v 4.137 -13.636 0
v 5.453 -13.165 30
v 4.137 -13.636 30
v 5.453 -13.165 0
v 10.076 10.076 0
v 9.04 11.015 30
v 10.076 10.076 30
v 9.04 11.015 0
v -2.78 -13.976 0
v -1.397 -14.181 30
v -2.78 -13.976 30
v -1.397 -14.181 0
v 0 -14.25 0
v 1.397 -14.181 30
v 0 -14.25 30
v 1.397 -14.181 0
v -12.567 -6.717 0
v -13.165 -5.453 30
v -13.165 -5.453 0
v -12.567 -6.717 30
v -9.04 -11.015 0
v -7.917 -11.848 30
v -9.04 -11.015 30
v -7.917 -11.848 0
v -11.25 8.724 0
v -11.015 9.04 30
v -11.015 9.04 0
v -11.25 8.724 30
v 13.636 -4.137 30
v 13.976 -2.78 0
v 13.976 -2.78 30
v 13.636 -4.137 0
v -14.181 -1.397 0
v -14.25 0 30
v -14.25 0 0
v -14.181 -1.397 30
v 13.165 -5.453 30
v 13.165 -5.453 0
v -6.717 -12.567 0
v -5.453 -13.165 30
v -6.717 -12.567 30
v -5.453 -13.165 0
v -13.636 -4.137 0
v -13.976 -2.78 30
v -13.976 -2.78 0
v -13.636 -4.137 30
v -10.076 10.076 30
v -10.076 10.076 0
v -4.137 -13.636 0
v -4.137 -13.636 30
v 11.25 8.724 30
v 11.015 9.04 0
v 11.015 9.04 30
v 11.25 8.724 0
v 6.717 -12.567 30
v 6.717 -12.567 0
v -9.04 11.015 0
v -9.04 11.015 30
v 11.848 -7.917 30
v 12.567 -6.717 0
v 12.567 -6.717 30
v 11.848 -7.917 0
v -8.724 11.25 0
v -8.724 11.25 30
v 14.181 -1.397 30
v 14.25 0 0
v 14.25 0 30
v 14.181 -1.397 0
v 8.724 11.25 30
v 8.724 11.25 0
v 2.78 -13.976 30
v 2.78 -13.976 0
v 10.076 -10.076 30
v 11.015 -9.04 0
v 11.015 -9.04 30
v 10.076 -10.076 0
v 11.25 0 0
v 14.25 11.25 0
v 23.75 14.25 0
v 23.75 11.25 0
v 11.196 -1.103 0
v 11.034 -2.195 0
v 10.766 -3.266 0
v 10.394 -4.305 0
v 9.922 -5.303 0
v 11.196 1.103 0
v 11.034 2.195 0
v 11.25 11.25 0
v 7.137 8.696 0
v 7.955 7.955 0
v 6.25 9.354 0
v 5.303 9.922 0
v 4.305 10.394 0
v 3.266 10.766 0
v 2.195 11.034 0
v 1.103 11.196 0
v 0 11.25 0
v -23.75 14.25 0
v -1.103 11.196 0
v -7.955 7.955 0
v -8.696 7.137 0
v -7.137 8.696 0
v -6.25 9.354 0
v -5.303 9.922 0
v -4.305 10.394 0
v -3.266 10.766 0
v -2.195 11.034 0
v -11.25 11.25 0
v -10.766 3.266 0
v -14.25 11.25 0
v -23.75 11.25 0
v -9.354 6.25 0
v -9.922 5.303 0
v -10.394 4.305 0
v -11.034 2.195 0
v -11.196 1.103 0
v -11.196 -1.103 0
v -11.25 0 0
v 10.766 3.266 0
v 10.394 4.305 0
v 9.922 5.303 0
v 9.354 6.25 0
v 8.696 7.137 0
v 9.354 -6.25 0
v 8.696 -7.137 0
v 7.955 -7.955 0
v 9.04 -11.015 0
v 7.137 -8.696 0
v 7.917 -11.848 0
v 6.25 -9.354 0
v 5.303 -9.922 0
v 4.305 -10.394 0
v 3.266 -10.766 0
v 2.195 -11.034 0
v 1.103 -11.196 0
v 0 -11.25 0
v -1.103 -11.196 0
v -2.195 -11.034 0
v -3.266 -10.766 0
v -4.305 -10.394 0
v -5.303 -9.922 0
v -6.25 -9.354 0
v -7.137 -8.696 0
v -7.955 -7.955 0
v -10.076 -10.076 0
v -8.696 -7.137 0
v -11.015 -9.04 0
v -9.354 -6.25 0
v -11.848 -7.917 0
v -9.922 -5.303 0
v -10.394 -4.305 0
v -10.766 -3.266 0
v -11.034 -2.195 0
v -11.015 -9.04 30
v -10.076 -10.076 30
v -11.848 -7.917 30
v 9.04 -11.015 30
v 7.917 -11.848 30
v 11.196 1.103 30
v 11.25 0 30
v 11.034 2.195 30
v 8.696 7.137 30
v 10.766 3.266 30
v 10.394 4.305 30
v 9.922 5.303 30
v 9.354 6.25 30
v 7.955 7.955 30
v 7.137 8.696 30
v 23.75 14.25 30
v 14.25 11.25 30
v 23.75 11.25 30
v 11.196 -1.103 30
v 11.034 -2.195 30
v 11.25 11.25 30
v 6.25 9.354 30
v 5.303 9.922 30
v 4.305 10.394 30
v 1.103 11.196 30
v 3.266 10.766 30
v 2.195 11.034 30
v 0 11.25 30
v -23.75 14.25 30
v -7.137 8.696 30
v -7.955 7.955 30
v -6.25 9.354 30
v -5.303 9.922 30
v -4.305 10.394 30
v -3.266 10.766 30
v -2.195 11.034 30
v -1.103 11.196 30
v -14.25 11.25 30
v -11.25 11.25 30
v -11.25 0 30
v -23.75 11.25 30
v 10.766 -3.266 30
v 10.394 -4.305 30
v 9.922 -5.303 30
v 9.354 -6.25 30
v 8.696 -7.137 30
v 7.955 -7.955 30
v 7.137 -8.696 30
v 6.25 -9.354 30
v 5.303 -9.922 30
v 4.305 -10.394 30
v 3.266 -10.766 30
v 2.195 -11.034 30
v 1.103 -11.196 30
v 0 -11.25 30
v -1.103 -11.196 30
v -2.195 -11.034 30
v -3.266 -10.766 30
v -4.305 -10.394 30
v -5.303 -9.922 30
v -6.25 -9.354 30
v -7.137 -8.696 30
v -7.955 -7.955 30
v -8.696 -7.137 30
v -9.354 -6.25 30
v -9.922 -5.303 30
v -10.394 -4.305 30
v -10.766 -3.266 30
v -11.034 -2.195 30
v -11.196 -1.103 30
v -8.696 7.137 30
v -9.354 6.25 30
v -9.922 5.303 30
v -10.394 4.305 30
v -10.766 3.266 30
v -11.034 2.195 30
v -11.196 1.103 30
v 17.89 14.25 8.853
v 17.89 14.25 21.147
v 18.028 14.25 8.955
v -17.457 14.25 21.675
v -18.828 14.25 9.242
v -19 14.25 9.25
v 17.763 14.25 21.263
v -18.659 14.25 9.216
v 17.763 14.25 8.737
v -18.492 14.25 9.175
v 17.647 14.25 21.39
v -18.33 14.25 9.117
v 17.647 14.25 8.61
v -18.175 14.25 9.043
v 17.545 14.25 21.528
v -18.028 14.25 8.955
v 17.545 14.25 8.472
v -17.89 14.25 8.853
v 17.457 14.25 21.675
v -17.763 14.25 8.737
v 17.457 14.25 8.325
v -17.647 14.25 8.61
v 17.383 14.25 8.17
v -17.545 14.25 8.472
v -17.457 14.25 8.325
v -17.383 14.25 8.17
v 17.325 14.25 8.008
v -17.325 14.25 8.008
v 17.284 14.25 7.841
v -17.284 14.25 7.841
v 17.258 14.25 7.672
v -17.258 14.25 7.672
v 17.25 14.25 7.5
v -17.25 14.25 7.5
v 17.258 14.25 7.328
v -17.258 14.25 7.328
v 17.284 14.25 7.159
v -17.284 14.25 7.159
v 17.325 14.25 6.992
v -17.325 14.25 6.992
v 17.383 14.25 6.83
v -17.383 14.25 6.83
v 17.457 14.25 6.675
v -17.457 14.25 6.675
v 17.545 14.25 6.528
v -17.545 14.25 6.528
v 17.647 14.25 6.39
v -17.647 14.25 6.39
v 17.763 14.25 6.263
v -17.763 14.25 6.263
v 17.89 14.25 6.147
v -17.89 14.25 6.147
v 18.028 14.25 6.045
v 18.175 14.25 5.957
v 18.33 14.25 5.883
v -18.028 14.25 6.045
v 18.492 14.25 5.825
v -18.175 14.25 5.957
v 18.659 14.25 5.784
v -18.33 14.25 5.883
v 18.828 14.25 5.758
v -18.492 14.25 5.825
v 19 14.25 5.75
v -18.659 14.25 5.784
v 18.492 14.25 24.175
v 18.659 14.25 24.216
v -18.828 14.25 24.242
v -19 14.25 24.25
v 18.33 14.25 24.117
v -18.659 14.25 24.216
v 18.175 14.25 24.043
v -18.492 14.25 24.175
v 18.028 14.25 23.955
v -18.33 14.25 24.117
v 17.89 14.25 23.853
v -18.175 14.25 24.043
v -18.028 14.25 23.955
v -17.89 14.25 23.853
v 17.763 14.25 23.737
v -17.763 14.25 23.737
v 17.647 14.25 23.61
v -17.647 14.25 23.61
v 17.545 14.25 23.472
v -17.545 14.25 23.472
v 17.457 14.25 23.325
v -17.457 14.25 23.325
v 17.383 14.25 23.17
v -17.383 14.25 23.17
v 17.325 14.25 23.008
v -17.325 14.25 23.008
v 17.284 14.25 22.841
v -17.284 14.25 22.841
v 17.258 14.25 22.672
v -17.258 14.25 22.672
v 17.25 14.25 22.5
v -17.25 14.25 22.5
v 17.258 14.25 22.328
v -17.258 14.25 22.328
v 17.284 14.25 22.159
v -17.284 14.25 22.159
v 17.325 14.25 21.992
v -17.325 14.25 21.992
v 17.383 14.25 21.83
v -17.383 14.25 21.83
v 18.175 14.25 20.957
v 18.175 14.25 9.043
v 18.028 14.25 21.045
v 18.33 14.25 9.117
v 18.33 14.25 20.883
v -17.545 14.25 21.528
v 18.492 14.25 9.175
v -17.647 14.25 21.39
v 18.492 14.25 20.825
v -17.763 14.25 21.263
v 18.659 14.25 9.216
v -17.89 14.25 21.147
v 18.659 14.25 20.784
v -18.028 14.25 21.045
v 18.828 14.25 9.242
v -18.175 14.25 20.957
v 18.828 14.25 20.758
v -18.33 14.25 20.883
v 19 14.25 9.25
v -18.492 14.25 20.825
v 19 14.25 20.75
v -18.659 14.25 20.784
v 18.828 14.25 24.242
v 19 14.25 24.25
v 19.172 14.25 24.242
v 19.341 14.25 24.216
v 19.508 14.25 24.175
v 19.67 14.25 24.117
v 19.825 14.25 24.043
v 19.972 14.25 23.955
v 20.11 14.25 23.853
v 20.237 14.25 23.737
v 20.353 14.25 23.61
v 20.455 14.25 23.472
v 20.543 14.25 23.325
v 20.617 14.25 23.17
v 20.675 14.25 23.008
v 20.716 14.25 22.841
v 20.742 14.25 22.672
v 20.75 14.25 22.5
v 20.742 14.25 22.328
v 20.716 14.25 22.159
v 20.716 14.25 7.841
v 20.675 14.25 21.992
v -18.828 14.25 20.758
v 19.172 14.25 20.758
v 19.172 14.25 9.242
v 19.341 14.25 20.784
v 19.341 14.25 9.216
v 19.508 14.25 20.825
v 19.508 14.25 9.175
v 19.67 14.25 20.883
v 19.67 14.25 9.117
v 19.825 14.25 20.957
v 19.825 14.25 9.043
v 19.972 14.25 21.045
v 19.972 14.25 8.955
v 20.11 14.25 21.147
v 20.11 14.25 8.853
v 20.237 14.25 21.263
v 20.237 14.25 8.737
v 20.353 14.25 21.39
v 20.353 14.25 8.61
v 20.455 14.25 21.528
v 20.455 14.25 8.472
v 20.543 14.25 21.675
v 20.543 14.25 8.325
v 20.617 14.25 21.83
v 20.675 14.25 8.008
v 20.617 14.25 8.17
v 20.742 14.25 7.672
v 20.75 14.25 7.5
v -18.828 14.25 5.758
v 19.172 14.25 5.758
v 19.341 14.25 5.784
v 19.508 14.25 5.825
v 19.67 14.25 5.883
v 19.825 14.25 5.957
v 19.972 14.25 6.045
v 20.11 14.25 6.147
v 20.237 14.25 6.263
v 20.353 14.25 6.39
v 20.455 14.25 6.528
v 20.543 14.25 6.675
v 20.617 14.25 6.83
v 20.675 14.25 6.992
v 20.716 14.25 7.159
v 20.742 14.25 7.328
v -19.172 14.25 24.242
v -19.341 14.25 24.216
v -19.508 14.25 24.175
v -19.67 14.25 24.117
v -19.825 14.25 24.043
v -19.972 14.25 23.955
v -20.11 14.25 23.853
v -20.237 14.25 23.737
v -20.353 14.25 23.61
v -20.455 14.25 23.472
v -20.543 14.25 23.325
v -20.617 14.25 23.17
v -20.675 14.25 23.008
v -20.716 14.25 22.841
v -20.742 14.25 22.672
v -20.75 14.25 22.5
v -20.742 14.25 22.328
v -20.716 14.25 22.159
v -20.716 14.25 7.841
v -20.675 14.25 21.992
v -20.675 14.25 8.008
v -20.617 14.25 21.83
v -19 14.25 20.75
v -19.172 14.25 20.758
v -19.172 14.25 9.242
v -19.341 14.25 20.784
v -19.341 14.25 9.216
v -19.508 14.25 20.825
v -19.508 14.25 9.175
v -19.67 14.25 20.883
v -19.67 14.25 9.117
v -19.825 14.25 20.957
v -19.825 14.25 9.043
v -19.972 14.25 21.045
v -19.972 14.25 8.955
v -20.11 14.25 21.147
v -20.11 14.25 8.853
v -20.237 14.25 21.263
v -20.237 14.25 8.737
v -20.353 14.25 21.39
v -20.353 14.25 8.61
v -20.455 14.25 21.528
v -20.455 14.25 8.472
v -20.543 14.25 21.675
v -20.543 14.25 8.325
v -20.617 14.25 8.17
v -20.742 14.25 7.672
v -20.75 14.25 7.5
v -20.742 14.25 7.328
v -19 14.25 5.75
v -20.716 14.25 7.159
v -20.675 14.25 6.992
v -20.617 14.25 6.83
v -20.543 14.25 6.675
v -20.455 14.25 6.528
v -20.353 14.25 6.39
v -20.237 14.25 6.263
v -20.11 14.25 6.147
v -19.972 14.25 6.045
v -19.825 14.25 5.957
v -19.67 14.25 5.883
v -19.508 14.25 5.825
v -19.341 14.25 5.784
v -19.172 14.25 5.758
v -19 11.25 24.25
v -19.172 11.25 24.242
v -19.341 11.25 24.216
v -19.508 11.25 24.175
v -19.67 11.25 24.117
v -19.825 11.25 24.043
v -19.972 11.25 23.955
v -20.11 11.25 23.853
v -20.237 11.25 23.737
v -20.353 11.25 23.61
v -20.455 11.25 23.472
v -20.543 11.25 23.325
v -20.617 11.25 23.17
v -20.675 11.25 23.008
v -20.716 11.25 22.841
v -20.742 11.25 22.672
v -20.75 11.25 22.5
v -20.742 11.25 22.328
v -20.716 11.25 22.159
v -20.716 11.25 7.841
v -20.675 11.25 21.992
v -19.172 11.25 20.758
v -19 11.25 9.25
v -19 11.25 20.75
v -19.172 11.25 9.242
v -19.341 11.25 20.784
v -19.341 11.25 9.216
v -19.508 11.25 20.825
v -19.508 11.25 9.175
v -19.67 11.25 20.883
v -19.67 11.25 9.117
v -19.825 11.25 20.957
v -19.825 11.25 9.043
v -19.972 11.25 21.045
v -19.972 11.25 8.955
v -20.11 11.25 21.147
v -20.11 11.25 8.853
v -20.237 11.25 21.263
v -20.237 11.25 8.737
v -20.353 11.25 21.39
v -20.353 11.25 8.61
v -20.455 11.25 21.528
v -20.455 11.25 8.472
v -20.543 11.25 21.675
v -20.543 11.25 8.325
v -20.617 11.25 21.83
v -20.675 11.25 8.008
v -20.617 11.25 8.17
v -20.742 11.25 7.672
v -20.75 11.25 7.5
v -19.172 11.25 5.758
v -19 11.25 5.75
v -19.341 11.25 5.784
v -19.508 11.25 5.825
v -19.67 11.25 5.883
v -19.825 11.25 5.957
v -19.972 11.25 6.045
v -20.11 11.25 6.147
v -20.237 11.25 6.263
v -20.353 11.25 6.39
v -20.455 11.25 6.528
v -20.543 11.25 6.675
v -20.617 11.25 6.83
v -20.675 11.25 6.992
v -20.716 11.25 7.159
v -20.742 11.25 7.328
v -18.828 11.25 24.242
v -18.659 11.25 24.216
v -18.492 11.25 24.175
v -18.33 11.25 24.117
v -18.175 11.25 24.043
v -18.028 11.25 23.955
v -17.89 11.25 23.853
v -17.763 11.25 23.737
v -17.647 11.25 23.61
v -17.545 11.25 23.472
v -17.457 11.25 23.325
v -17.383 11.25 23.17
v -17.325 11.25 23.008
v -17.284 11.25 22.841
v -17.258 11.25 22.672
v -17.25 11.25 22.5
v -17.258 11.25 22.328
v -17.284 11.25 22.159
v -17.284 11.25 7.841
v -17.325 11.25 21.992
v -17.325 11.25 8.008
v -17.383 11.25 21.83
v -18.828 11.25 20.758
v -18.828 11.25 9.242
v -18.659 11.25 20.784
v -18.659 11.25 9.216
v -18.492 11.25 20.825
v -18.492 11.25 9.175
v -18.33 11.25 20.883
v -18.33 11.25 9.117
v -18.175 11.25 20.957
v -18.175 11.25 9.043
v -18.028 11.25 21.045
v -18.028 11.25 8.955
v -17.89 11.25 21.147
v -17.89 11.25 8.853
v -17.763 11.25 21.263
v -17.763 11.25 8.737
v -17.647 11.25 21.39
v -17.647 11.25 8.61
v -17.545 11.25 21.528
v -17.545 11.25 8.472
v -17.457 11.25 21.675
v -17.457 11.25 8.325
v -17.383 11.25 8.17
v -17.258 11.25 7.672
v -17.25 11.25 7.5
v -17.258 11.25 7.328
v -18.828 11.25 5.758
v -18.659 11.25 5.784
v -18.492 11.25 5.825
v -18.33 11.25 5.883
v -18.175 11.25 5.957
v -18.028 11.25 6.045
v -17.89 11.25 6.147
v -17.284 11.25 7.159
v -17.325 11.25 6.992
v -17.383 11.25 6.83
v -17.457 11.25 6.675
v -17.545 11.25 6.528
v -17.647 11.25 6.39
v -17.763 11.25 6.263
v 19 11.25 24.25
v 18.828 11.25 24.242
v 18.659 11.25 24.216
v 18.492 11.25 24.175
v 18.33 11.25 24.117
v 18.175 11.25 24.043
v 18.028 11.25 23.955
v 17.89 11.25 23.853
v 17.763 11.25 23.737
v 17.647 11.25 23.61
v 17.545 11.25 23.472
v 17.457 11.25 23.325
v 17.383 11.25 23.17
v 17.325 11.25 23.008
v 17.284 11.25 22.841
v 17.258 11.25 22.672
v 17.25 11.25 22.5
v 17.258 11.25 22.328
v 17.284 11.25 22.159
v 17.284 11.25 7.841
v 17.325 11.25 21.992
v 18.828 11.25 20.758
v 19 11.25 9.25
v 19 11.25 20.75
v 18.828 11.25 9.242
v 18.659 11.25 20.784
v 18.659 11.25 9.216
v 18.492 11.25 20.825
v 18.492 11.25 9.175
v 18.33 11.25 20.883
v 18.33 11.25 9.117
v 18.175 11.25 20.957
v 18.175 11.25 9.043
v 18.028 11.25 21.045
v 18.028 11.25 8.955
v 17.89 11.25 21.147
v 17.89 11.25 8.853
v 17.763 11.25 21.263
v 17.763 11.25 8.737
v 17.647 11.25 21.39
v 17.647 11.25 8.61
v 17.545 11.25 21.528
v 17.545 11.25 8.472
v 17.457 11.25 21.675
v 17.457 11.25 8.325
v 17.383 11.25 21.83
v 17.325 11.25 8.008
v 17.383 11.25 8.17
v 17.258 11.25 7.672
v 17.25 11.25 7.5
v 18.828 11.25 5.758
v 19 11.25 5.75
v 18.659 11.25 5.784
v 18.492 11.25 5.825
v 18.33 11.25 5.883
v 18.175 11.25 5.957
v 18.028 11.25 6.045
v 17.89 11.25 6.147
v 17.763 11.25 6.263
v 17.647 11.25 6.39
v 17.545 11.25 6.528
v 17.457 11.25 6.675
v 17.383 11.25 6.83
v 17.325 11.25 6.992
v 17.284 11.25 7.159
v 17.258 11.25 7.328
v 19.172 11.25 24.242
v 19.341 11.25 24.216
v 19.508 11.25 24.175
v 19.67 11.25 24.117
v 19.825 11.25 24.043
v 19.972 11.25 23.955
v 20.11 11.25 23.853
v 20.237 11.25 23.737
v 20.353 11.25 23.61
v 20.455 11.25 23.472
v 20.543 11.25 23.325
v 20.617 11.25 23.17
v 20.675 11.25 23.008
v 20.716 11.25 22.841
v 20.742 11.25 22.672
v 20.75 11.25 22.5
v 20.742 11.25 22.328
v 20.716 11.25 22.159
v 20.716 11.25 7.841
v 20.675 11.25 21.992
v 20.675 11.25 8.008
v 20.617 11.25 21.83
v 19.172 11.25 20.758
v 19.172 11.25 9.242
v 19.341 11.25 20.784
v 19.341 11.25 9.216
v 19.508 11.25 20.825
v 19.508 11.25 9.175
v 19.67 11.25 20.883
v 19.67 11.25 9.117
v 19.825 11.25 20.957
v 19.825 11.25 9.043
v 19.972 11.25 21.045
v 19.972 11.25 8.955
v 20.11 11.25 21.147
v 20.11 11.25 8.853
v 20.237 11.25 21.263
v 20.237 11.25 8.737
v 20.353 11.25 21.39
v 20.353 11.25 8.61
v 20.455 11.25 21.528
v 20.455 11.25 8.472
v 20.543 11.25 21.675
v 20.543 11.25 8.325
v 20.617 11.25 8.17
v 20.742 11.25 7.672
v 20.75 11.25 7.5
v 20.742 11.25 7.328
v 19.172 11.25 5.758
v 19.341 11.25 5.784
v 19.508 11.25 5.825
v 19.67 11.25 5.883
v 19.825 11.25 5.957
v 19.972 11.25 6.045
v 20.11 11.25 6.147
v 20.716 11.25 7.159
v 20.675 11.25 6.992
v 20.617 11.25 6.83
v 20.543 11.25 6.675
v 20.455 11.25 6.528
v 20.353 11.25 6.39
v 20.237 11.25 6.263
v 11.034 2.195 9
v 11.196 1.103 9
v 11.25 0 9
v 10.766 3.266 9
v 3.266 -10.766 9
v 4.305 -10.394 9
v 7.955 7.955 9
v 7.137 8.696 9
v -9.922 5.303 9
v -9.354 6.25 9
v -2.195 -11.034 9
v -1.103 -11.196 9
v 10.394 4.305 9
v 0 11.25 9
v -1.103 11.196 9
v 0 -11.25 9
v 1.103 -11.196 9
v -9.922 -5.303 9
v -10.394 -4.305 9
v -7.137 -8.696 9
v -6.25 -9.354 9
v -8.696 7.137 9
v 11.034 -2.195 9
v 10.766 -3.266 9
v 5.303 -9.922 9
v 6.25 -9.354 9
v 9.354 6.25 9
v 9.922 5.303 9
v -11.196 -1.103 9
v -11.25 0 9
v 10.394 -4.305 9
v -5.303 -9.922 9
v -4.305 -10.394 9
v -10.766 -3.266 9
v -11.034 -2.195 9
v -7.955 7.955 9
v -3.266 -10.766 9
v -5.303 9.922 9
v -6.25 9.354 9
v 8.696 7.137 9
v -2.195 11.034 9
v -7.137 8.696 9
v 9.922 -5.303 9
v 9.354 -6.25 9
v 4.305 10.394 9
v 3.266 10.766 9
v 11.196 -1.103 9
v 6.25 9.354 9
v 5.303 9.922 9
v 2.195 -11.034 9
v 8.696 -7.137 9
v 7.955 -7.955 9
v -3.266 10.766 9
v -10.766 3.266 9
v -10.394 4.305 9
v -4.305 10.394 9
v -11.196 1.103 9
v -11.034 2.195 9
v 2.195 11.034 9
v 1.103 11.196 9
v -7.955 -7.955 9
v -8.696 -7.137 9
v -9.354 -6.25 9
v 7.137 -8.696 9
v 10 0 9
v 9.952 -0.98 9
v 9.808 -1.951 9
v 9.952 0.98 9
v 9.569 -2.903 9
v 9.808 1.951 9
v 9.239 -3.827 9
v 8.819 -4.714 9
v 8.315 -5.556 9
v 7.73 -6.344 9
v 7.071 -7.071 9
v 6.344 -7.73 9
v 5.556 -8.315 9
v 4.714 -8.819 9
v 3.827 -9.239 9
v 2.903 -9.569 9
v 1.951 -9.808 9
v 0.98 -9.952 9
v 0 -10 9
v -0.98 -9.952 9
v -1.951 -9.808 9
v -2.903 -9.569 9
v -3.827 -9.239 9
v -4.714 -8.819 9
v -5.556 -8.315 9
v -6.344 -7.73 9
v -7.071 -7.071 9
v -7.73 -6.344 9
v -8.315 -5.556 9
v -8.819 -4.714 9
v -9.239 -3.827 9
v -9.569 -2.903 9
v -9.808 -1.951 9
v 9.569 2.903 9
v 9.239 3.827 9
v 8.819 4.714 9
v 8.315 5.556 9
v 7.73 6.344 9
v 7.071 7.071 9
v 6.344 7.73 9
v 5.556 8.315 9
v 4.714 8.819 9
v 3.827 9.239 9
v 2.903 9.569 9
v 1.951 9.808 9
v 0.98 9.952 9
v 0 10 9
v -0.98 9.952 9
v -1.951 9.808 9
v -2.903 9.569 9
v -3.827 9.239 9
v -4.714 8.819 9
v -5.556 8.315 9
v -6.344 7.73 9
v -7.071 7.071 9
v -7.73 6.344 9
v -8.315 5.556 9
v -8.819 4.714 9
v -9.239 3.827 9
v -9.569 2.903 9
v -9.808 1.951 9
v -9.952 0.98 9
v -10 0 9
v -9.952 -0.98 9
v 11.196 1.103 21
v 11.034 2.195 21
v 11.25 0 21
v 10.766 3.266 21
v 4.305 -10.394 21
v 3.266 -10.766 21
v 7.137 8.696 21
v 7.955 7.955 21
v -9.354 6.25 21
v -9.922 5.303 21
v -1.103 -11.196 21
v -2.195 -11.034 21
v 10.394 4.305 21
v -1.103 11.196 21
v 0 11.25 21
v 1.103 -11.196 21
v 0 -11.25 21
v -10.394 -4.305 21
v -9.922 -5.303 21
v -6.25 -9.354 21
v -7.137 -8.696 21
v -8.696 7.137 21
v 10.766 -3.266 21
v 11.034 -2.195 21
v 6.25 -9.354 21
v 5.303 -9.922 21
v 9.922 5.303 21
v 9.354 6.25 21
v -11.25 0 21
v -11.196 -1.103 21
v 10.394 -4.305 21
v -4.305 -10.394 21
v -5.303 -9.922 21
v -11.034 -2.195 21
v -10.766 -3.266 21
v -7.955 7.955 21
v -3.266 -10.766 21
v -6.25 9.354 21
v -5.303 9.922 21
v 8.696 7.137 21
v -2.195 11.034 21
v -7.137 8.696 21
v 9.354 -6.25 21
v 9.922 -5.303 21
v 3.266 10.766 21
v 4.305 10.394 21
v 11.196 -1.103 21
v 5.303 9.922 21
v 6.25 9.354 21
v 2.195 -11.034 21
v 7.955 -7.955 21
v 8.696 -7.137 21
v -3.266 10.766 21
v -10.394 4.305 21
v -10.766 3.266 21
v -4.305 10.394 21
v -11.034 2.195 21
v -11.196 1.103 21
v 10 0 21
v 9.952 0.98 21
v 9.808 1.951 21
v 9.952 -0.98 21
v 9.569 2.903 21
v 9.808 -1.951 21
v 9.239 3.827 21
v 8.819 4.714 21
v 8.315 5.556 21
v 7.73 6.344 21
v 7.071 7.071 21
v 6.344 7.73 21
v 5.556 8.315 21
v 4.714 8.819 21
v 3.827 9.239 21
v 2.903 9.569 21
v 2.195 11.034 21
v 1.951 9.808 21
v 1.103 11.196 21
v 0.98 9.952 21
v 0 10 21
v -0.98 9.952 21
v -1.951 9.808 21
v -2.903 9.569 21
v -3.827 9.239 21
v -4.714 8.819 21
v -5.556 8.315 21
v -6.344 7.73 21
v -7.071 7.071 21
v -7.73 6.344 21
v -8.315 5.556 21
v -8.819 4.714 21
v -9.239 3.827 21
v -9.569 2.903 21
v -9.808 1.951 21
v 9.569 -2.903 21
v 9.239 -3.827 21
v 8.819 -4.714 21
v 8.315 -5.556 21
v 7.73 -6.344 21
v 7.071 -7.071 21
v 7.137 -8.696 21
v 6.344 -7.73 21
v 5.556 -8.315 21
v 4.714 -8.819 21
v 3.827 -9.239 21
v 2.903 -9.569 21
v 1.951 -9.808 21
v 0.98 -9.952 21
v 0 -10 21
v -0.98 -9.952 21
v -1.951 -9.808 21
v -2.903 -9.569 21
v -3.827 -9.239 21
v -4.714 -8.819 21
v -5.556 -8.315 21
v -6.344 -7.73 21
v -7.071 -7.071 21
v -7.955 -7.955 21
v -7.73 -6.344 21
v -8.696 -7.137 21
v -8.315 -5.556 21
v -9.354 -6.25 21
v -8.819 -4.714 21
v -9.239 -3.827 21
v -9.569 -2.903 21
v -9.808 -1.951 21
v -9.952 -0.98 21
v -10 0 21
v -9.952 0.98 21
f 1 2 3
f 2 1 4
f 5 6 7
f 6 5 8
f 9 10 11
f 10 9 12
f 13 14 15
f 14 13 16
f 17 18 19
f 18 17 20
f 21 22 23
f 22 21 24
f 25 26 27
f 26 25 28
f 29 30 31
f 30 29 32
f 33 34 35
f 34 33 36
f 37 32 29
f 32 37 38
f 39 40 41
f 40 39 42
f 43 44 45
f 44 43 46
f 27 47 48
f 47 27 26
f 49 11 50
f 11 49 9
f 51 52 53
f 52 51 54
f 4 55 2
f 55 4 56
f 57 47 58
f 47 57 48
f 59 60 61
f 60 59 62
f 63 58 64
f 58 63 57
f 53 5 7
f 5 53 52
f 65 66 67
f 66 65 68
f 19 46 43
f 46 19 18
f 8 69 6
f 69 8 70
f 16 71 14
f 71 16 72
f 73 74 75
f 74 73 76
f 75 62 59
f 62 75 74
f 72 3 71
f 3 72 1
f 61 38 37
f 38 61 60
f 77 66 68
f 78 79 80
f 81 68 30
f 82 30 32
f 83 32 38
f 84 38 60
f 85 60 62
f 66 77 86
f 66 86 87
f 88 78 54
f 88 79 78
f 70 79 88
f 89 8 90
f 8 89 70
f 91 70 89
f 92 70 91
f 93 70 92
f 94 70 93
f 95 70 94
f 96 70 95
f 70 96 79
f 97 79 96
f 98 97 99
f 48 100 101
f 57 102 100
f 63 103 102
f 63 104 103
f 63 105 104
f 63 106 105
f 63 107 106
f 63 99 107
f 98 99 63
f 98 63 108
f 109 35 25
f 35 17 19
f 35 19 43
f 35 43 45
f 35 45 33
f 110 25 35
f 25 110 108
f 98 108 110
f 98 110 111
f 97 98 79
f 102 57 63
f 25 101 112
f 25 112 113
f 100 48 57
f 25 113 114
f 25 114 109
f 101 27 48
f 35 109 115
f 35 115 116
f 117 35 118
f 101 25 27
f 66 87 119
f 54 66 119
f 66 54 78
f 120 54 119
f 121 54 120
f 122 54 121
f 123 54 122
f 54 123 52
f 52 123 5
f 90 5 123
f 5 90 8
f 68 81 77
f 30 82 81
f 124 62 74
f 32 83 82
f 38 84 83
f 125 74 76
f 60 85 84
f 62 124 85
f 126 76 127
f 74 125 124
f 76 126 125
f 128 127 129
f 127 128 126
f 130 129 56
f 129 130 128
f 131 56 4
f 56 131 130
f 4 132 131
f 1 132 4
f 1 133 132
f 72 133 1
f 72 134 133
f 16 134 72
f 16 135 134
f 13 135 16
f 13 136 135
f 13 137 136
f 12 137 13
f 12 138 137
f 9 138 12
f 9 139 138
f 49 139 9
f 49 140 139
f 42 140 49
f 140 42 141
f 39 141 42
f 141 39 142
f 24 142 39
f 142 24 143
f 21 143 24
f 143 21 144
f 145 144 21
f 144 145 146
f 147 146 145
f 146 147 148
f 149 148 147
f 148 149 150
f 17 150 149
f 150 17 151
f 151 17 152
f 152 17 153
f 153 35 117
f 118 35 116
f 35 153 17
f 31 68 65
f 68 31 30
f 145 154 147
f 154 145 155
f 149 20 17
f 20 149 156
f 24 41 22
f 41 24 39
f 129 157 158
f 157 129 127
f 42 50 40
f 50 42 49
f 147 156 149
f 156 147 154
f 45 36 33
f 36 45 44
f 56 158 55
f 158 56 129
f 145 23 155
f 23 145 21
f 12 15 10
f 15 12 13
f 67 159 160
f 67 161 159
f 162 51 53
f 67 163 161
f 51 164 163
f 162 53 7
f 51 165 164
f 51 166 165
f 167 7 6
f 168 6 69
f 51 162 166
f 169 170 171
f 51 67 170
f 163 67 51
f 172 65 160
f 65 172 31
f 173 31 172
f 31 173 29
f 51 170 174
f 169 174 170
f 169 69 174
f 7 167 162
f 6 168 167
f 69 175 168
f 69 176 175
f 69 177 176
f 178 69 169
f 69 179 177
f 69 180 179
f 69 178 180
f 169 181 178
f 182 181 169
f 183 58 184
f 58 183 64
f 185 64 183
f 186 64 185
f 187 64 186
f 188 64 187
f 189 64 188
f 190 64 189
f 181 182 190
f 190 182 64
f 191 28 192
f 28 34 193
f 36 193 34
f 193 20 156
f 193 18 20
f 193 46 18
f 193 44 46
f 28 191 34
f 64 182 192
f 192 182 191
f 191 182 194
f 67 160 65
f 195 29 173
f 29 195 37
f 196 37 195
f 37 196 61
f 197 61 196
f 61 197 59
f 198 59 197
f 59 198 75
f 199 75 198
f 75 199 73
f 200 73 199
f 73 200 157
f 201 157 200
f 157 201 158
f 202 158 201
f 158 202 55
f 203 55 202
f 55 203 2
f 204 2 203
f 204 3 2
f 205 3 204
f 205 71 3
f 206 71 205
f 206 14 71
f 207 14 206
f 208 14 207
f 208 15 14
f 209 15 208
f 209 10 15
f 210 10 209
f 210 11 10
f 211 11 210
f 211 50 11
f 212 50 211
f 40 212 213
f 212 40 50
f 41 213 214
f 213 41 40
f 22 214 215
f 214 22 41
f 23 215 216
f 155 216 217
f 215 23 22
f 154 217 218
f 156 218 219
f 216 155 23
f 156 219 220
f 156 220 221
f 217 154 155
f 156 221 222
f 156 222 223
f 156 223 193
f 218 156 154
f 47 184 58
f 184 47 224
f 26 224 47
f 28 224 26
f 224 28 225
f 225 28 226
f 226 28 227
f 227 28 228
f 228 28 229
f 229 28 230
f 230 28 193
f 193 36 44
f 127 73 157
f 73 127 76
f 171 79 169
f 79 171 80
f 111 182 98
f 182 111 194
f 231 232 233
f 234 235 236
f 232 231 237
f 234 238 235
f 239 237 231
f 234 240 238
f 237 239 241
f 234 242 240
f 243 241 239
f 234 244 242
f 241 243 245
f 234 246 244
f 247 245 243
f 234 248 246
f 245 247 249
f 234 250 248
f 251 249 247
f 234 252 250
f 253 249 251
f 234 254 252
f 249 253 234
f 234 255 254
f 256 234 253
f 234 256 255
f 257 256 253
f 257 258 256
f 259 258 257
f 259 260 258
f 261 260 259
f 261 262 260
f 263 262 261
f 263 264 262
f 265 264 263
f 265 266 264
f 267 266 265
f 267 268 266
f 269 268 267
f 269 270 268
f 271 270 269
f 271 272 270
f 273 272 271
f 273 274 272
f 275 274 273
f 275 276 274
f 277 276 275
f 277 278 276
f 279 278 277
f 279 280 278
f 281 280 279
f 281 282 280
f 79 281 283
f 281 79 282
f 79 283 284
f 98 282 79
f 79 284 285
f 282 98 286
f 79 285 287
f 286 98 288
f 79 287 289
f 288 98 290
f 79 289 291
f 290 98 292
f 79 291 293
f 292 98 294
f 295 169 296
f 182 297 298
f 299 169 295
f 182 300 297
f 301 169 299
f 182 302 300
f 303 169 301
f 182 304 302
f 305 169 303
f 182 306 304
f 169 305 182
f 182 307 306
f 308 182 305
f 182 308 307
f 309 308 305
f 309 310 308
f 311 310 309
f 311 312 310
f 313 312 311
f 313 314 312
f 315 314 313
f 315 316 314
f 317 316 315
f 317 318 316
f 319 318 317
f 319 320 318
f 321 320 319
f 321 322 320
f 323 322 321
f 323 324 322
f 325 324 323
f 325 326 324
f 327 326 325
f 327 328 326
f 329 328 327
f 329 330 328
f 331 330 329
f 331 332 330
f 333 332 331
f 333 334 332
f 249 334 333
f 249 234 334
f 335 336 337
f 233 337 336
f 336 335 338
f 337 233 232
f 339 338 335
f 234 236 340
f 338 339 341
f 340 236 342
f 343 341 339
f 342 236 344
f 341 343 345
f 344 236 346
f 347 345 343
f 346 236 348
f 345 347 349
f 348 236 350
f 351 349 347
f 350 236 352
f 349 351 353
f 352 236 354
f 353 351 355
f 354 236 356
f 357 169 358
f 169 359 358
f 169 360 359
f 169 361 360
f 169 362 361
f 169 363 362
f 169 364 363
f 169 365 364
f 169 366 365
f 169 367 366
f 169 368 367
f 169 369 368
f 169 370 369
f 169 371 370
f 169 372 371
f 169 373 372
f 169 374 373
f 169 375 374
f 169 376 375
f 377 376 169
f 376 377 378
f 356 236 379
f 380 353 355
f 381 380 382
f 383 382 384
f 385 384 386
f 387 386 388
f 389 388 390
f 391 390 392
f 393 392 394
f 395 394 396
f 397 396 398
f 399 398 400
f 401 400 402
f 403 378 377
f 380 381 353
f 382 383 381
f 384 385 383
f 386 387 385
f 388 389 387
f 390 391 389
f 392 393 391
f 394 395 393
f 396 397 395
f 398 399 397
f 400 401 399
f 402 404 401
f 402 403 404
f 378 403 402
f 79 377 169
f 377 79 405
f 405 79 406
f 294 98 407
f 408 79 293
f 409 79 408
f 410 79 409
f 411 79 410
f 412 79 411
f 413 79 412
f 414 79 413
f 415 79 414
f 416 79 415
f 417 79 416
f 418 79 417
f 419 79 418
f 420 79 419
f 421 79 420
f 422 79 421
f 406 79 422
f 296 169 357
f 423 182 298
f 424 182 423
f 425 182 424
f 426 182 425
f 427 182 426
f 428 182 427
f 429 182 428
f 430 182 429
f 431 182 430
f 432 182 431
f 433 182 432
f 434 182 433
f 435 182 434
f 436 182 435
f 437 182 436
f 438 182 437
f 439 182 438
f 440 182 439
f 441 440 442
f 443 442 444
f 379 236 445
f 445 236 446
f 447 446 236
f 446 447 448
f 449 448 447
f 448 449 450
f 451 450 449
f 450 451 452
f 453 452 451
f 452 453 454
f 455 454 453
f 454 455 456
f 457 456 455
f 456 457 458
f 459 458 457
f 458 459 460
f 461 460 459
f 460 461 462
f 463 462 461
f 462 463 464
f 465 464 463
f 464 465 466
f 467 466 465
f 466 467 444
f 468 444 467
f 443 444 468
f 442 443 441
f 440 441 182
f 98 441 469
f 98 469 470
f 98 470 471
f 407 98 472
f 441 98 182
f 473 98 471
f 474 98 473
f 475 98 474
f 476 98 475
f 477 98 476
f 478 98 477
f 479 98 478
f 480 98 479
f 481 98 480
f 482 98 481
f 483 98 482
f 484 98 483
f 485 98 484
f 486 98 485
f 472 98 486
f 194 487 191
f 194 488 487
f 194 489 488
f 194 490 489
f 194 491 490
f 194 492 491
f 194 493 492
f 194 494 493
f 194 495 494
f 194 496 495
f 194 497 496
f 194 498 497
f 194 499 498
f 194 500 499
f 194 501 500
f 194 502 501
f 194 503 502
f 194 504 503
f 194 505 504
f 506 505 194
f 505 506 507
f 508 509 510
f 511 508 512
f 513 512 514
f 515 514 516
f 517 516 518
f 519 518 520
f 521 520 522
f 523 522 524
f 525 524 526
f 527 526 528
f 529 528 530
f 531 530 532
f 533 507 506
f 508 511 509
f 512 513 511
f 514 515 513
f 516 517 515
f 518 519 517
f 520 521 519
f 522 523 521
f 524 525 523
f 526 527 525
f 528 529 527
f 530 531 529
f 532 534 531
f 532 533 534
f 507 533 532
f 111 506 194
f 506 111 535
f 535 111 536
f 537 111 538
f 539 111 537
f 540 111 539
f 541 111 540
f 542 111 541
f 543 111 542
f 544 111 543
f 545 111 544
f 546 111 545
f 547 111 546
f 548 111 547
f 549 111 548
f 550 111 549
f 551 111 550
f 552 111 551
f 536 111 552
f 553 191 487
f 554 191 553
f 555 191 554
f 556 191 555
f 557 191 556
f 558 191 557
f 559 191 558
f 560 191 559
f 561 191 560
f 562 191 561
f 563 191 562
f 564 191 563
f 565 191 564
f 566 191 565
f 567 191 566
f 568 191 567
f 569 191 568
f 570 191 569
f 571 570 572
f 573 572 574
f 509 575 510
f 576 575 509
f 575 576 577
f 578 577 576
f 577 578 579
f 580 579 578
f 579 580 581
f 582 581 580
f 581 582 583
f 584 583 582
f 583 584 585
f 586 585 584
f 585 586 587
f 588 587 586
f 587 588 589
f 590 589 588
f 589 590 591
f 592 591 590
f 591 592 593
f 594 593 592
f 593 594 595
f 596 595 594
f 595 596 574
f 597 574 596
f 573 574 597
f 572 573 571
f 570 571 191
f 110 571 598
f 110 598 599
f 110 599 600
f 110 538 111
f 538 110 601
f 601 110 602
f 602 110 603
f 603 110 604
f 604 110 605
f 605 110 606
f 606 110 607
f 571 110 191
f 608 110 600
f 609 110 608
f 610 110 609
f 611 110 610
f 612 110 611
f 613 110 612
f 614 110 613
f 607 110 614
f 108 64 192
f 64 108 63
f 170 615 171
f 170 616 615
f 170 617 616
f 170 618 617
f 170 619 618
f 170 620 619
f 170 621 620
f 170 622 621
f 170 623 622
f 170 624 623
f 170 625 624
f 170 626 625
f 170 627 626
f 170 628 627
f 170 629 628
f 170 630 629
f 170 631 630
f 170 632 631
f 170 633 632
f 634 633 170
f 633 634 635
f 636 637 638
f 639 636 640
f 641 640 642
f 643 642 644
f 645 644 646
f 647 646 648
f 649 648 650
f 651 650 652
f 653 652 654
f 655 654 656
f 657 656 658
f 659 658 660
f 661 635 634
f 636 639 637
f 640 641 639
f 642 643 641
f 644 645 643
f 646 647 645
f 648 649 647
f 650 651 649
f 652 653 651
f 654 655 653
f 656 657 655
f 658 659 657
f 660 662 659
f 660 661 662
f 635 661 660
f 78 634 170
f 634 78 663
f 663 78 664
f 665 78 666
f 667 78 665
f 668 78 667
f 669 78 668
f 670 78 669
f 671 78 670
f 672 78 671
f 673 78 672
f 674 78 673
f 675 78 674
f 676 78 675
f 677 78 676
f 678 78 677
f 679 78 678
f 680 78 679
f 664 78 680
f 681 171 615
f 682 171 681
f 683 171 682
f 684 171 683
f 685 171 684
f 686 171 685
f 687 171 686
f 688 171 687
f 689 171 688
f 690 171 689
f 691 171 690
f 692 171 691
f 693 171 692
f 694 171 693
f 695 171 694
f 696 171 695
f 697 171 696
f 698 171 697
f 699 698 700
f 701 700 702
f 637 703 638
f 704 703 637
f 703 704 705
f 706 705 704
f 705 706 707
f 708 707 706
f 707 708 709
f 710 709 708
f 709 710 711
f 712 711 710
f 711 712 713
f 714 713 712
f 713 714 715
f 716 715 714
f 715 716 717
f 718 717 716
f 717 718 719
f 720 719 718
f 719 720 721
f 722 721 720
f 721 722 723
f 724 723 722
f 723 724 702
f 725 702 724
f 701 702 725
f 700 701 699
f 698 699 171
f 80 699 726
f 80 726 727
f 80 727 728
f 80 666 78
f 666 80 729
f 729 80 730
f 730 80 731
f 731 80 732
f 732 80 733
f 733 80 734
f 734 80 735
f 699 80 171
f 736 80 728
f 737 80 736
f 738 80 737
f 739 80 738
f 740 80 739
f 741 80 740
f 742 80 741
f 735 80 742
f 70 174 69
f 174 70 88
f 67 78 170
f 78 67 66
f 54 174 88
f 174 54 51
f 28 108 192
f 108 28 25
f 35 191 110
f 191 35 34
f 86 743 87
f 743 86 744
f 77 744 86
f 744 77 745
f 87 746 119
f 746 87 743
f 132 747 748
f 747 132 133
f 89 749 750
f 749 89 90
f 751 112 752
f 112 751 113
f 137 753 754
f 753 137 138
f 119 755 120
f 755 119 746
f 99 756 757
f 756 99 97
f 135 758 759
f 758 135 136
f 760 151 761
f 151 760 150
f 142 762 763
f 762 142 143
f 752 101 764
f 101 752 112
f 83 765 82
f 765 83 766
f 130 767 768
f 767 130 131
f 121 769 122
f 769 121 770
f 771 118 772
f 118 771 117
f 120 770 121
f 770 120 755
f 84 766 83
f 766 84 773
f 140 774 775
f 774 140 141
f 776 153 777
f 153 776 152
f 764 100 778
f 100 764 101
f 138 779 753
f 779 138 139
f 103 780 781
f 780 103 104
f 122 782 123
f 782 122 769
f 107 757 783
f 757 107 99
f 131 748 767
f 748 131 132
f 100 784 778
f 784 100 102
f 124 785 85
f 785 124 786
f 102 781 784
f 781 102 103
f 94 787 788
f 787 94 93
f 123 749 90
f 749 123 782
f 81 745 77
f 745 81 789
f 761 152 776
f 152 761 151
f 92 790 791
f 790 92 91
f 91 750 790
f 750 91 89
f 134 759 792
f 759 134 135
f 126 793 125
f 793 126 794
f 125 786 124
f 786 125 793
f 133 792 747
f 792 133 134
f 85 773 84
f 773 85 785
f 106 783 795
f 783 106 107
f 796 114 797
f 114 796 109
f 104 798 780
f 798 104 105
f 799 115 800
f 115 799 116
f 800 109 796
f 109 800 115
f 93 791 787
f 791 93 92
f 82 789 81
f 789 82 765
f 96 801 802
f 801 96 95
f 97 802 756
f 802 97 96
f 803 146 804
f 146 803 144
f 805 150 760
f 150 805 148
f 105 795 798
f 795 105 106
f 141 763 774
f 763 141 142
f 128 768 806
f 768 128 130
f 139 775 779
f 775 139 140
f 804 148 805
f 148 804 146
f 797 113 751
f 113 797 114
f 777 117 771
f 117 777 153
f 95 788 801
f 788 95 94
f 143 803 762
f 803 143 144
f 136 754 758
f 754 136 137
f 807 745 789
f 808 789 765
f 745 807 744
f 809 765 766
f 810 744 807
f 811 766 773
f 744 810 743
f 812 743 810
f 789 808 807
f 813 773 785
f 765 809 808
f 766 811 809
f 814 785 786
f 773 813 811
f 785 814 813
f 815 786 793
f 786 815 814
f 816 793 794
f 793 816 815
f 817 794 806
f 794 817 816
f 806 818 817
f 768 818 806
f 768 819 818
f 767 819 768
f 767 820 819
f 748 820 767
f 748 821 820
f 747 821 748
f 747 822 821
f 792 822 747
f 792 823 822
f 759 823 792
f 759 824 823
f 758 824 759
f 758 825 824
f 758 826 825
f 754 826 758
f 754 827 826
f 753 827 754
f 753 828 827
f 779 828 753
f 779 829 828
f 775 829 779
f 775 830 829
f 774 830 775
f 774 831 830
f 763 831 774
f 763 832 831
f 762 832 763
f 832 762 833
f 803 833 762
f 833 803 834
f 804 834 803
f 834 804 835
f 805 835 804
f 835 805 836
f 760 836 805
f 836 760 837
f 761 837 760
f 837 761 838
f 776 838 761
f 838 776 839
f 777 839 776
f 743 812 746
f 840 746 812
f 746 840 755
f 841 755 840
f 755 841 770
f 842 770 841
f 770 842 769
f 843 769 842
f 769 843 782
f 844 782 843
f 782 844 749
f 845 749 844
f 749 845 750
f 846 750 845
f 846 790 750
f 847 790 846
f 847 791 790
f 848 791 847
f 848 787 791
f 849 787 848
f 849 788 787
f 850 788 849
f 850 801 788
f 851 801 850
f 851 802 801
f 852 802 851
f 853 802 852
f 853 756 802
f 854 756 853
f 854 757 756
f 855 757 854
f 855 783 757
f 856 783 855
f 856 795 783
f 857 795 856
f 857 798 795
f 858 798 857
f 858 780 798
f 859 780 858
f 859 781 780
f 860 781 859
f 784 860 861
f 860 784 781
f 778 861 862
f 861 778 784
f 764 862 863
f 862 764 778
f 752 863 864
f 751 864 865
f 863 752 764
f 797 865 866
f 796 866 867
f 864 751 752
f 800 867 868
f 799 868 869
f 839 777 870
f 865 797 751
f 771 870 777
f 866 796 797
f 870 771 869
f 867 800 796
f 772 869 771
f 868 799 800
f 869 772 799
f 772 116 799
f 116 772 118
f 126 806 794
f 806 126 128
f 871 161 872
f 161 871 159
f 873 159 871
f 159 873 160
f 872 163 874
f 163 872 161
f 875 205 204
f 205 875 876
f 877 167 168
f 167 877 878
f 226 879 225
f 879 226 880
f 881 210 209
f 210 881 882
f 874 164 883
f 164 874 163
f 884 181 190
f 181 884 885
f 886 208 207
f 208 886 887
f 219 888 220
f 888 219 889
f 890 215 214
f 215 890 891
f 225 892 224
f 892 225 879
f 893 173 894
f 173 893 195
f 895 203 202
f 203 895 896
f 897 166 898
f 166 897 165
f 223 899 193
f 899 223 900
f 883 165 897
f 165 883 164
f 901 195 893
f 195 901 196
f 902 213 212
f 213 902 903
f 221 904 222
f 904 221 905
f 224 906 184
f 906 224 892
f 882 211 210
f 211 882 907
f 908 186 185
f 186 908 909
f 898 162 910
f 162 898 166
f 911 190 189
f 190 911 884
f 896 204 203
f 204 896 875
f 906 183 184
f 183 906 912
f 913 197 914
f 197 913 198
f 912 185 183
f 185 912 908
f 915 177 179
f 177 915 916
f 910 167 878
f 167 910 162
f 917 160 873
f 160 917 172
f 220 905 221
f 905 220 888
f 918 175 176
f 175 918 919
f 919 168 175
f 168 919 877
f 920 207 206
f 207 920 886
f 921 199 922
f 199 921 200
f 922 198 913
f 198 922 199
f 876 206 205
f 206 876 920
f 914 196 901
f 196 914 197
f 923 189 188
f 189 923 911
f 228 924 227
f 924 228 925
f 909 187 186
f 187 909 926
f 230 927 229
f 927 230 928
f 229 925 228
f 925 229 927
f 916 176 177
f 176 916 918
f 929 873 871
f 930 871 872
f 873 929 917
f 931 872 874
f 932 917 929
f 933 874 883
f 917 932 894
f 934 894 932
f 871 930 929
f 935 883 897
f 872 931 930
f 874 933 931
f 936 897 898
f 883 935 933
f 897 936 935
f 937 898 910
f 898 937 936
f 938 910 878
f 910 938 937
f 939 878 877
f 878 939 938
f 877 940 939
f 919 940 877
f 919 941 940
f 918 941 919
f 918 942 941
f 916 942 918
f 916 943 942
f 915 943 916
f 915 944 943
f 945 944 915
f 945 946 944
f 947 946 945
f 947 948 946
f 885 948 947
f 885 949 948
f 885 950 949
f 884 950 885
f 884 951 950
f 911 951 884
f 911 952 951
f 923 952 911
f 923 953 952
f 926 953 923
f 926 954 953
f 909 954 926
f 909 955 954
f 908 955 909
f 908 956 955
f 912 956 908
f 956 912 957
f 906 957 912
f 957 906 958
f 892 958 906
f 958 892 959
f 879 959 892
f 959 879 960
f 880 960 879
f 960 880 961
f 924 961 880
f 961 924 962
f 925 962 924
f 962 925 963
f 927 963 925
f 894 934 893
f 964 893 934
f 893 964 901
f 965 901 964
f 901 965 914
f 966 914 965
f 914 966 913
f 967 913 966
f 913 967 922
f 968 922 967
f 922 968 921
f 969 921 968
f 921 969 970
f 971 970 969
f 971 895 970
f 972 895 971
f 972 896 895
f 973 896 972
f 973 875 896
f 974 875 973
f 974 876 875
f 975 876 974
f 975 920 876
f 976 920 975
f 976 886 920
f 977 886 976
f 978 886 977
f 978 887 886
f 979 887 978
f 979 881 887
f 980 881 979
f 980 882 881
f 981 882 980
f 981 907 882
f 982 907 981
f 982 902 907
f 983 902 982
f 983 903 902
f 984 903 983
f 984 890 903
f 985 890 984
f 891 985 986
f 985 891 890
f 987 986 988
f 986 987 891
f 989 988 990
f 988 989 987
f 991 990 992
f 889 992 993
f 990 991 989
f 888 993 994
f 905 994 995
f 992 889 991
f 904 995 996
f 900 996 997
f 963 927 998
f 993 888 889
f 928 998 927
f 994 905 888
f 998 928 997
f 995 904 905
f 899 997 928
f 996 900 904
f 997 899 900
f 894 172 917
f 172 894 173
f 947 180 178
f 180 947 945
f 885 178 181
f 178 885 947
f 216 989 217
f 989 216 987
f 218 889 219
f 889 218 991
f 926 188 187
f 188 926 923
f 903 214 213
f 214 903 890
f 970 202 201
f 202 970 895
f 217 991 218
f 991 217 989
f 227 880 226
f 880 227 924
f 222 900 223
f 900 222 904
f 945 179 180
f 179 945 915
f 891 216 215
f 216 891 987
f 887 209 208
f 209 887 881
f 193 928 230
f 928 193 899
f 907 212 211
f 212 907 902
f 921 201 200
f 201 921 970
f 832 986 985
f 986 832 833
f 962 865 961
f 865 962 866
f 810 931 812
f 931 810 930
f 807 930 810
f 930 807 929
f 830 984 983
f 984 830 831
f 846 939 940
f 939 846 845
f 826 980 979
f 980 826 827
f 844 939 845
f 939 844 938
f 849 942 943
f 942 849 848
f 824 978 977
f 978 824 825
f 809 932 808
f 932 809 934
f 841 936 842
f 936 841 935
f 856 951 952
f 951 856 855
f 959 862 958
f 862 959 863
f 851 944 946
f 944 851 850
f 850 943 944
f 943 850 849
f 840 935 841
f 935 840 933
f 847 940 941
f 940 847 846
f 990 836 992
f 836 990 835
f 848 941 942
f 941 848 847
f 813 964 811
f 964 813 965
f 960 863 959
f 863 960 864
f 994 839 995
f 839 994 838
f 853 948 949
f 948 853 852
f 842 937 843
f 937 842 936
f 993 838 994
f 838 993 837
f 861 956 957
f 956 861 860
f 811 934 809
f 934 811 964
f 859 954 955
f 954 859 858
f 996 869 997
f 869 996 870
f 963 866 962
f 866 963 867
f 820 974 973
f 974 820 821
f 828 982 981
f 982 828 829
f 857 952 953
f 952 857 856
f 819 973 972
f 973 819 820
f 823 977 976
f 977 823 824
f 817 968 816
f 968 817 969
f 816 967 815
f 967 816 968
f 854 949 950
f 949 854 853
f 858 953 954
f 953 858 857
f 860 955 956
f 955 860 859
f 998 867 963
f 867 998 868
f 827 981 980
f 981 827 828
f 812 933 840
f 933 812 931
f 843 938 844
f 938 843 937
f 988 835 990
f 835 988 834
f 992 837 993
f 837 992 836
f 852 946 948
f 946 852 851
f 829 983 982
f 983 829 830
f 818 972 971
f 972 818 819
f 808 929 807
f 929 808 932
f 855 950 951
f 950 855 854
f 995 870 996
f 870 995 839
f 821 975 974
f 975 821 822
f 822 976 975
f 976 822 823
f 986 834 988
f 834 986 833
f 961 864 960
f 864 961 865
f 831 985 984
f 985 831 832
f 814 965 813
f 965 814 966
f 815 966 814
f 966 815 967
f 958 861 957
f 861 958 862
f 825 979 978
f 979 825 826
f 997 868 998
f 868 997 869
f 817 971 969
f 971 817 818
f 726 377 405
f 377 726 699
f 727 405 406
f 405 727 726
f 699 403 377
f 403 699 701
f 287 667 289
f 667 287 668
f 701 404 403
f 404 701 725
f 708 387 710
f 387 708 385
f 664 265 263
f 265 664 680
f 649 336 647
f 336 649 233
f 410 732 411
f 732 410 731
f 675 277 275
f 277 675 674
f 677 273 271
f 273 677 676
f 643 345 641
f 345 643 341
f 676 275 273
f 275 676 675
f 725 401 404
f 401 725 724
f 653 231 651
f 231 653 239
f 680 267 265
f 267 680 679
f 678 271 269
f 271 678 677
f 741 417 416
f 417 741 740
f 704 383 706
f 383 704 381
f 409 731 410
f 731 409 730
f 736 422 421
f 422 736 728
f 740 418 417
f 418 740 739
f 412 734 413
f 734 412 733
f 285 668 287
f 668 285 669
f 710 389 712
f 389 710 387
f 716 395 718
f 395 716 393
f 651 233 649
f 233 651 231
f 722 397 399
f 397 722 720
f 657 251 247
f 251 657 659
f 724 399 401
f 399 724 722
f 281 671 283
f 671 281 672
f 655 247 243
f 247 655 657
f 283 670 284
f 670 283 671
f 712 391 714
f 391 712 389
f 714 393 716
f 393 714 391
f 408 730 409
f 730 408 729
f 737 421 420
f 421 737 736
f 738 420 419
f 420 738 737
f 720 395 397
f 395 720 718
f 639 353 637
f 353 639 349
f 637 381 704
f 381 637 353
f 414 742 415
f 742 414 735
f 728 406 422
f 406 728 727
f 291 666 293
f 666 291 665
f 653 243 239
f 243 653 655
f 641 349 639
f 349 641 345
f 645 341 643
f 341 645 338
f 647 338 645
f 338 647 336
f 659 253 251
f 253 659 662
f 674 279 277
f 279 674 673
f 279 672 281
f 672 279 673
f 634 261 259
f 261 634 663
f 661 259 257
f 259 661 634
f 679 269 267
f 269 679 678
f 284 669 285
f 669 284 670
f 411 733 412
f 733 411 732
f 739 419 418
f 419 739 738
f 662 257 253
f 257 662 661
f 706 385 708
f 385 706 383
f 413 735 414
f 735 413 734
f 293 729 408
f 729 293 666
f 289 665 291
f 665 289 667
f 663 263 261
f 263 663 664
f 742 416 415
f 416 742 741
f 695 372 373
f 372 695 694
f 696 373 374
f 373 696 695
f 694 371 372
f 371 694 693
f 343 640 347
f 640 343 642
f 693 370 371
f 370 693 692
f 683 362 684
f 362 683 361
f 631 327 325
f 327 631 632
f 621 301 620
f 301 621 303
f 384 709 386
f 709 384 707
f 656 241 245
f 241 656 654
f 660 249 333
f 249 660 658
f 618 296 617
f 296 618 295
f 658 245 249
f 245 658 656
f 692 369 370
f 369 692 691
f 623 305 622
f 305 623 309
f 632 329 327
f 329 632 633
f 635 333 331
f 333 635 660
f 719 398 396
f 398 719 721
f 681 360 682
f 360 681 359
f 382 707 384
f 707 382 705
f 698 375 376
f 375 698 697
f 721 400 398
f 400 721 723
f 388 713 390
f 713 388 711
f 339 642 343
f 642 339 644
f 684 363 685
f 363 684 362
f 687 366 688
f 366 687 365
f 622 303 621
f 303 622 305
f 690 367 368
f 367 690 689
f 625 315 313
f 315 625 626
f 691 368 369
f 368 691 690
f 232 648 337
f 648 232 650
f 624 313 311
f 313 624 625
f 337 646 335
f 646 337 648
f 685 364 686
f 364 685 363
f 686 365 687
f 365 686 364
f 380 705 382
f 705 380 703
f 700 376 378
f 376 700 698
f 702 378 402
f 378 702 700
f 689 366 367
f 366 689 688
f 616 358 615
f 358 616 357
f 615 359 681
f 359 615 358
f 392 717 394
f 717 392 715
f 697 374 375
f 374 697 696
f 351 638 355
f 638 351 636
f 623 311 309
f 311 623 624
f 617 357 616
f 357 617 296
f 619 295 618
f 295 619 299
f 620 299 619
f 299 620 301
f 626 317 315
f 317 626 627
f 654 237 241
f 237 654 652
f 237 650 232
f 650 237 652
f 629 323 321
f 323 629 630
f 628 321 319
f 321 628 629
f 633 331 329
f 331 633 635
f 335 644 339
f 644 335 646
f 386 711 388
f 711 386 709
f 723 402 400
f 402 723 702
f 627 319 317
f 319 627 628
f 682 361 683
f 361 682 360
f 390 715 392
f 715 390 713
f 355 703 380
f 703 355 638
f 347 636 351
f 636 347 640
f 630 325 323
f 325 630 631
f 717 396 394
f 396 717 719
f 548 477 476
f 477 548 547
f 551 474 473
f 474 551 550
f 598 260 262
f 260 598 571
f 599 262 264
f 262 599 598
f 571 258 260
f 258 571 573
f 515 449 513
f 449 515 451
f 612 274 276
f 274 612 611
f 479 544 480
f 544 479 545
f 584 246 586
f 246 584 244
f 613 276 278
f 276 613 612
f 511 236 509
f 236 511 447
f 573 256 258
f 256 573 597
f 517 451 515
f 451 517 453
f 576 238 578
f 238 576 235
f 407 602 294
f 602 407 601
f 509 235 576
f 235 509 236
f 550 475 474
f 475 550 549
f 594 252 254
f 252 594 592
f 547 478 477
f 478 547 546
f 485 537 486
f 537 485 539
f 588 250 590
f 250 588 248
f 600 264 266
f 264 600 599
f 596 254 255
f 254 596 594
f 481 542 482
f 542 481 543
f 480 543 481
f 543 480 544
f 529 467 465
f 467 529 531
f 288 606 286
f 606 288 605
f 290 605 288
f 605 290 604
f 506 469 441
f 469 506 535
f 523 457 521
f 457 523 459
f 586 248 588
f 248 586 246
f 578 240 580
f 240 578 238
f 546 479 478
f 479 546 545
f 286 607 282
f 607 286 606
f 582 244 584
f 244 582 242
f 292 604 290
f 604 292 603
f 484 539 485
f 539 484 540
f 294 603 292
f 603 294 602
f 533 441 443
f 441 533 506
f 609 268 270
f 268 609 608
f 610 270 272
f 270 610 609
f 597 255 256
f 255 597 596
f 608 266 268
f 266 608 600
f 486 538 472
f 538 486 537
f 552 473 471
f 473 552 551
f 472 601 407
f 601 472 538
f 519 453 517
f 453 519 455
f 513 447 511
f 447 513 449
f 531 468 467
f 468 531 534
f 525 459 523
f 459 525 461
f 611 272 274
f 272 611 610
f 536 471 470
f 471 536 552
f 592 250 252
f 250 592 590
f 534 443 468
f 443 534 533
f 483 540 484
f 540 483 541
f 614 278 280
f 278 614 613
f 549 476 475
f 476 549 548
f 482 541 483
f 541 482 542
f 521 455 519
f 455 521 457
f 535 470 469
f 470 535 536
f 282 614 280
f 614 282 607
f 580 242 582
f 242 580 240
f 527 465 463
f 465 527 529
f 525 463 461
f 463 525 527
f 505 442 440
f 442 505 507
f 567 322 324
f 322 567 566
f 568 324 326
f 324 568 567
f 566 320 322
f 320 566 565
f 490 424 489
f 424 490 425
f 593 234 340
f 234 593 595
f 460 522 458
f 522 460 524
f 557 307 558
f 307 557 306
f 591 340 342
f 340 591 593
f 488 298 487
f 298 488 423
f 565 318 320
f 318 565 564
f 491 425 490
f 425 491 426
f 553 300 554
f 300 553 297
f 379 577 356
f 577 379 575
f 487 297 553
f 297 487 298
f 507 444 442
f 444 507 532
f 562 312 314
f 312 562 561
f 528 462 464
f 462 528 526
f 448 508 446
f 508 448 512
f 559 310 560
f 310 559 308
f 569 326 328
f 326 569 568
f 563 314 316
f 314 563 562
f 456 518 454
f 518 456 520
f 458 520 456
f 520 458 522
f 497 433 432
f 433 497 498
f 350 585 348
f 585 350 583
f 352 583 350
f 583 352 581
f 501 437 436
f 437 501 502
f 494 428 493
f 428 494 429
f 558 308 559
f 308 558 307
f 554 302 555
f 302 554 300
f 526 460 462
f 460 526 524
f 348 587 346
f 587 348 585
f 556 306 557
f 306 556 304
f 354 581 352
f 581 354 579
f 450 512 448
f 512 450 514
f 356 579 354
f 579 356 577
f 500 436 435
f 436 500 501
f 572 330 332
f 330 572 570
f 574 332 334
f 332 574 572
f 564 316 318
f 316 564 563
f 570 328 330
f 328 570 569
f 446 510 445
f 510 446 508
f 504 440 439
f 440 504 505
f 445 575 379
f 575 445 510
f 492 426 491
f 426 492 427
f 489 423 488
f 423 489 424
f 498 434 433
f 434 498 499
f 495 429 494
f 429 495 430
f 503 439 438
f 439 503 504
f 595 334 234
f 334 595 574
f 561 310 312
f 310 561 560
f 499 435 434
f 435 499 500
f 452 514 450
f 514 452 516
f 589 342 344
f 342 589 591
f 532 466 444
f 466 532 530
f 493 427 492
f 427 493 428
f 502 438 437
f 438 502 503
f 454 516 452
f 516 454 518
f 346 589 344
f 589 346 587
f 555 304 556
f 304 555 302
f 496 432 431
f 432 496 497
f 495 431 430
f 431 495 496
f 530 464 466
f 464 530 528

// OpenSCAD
d608 = 22.5;
wall = 3;
h = 30;
fn = 64;
screw = 3.5;

mount_x = d608+wall*2 + screw*2+wall*4;


difference() {
    union() {
        cylinder(r=d608/2+wall, h= h, $fn=fn);
        translate([-mount_x/2,d608/2,0]) cube([mount_x,wall,h]);
        
        translate([d608/2,0,0]) cube([wall,d608/2,h]);
        translate([-d608/2-wall,0,0]) cube([wall,d608/2,h]);
    }
    translate([0,0,0]) cylinder(r=d608/2, h= 9, $fn=fn);
    translate([0,0,h-9]) cylinder(r=d608/2, h= 9, $fn=fn);
    
     translate([0,0,-1]) cylinder(r=10, h= h, $fn=fn);
    
    translate([mount_x/2-screw/2-wall,h,h/4]) rotate([90,0,0]) cylinder(d=screw, h= h, $fn=fn);
    translate([mount_x/2-screw/2-wall,h,h*3/4]) rotate([90,0,0]) cylinder(d=screw, h= h, $fn=fn);
    translate([-(mount_x/2-screw/2-wall),h,h/4]) rotate([90,0,0]) cylinder(d=screw, h= h, $fn=fn);
    translate([-(mount_x/2-screw/2-wall),h,h*3/4]) rotate([90,0,0]) cylinder(d=screw, h= h, $fn=fn);
}
